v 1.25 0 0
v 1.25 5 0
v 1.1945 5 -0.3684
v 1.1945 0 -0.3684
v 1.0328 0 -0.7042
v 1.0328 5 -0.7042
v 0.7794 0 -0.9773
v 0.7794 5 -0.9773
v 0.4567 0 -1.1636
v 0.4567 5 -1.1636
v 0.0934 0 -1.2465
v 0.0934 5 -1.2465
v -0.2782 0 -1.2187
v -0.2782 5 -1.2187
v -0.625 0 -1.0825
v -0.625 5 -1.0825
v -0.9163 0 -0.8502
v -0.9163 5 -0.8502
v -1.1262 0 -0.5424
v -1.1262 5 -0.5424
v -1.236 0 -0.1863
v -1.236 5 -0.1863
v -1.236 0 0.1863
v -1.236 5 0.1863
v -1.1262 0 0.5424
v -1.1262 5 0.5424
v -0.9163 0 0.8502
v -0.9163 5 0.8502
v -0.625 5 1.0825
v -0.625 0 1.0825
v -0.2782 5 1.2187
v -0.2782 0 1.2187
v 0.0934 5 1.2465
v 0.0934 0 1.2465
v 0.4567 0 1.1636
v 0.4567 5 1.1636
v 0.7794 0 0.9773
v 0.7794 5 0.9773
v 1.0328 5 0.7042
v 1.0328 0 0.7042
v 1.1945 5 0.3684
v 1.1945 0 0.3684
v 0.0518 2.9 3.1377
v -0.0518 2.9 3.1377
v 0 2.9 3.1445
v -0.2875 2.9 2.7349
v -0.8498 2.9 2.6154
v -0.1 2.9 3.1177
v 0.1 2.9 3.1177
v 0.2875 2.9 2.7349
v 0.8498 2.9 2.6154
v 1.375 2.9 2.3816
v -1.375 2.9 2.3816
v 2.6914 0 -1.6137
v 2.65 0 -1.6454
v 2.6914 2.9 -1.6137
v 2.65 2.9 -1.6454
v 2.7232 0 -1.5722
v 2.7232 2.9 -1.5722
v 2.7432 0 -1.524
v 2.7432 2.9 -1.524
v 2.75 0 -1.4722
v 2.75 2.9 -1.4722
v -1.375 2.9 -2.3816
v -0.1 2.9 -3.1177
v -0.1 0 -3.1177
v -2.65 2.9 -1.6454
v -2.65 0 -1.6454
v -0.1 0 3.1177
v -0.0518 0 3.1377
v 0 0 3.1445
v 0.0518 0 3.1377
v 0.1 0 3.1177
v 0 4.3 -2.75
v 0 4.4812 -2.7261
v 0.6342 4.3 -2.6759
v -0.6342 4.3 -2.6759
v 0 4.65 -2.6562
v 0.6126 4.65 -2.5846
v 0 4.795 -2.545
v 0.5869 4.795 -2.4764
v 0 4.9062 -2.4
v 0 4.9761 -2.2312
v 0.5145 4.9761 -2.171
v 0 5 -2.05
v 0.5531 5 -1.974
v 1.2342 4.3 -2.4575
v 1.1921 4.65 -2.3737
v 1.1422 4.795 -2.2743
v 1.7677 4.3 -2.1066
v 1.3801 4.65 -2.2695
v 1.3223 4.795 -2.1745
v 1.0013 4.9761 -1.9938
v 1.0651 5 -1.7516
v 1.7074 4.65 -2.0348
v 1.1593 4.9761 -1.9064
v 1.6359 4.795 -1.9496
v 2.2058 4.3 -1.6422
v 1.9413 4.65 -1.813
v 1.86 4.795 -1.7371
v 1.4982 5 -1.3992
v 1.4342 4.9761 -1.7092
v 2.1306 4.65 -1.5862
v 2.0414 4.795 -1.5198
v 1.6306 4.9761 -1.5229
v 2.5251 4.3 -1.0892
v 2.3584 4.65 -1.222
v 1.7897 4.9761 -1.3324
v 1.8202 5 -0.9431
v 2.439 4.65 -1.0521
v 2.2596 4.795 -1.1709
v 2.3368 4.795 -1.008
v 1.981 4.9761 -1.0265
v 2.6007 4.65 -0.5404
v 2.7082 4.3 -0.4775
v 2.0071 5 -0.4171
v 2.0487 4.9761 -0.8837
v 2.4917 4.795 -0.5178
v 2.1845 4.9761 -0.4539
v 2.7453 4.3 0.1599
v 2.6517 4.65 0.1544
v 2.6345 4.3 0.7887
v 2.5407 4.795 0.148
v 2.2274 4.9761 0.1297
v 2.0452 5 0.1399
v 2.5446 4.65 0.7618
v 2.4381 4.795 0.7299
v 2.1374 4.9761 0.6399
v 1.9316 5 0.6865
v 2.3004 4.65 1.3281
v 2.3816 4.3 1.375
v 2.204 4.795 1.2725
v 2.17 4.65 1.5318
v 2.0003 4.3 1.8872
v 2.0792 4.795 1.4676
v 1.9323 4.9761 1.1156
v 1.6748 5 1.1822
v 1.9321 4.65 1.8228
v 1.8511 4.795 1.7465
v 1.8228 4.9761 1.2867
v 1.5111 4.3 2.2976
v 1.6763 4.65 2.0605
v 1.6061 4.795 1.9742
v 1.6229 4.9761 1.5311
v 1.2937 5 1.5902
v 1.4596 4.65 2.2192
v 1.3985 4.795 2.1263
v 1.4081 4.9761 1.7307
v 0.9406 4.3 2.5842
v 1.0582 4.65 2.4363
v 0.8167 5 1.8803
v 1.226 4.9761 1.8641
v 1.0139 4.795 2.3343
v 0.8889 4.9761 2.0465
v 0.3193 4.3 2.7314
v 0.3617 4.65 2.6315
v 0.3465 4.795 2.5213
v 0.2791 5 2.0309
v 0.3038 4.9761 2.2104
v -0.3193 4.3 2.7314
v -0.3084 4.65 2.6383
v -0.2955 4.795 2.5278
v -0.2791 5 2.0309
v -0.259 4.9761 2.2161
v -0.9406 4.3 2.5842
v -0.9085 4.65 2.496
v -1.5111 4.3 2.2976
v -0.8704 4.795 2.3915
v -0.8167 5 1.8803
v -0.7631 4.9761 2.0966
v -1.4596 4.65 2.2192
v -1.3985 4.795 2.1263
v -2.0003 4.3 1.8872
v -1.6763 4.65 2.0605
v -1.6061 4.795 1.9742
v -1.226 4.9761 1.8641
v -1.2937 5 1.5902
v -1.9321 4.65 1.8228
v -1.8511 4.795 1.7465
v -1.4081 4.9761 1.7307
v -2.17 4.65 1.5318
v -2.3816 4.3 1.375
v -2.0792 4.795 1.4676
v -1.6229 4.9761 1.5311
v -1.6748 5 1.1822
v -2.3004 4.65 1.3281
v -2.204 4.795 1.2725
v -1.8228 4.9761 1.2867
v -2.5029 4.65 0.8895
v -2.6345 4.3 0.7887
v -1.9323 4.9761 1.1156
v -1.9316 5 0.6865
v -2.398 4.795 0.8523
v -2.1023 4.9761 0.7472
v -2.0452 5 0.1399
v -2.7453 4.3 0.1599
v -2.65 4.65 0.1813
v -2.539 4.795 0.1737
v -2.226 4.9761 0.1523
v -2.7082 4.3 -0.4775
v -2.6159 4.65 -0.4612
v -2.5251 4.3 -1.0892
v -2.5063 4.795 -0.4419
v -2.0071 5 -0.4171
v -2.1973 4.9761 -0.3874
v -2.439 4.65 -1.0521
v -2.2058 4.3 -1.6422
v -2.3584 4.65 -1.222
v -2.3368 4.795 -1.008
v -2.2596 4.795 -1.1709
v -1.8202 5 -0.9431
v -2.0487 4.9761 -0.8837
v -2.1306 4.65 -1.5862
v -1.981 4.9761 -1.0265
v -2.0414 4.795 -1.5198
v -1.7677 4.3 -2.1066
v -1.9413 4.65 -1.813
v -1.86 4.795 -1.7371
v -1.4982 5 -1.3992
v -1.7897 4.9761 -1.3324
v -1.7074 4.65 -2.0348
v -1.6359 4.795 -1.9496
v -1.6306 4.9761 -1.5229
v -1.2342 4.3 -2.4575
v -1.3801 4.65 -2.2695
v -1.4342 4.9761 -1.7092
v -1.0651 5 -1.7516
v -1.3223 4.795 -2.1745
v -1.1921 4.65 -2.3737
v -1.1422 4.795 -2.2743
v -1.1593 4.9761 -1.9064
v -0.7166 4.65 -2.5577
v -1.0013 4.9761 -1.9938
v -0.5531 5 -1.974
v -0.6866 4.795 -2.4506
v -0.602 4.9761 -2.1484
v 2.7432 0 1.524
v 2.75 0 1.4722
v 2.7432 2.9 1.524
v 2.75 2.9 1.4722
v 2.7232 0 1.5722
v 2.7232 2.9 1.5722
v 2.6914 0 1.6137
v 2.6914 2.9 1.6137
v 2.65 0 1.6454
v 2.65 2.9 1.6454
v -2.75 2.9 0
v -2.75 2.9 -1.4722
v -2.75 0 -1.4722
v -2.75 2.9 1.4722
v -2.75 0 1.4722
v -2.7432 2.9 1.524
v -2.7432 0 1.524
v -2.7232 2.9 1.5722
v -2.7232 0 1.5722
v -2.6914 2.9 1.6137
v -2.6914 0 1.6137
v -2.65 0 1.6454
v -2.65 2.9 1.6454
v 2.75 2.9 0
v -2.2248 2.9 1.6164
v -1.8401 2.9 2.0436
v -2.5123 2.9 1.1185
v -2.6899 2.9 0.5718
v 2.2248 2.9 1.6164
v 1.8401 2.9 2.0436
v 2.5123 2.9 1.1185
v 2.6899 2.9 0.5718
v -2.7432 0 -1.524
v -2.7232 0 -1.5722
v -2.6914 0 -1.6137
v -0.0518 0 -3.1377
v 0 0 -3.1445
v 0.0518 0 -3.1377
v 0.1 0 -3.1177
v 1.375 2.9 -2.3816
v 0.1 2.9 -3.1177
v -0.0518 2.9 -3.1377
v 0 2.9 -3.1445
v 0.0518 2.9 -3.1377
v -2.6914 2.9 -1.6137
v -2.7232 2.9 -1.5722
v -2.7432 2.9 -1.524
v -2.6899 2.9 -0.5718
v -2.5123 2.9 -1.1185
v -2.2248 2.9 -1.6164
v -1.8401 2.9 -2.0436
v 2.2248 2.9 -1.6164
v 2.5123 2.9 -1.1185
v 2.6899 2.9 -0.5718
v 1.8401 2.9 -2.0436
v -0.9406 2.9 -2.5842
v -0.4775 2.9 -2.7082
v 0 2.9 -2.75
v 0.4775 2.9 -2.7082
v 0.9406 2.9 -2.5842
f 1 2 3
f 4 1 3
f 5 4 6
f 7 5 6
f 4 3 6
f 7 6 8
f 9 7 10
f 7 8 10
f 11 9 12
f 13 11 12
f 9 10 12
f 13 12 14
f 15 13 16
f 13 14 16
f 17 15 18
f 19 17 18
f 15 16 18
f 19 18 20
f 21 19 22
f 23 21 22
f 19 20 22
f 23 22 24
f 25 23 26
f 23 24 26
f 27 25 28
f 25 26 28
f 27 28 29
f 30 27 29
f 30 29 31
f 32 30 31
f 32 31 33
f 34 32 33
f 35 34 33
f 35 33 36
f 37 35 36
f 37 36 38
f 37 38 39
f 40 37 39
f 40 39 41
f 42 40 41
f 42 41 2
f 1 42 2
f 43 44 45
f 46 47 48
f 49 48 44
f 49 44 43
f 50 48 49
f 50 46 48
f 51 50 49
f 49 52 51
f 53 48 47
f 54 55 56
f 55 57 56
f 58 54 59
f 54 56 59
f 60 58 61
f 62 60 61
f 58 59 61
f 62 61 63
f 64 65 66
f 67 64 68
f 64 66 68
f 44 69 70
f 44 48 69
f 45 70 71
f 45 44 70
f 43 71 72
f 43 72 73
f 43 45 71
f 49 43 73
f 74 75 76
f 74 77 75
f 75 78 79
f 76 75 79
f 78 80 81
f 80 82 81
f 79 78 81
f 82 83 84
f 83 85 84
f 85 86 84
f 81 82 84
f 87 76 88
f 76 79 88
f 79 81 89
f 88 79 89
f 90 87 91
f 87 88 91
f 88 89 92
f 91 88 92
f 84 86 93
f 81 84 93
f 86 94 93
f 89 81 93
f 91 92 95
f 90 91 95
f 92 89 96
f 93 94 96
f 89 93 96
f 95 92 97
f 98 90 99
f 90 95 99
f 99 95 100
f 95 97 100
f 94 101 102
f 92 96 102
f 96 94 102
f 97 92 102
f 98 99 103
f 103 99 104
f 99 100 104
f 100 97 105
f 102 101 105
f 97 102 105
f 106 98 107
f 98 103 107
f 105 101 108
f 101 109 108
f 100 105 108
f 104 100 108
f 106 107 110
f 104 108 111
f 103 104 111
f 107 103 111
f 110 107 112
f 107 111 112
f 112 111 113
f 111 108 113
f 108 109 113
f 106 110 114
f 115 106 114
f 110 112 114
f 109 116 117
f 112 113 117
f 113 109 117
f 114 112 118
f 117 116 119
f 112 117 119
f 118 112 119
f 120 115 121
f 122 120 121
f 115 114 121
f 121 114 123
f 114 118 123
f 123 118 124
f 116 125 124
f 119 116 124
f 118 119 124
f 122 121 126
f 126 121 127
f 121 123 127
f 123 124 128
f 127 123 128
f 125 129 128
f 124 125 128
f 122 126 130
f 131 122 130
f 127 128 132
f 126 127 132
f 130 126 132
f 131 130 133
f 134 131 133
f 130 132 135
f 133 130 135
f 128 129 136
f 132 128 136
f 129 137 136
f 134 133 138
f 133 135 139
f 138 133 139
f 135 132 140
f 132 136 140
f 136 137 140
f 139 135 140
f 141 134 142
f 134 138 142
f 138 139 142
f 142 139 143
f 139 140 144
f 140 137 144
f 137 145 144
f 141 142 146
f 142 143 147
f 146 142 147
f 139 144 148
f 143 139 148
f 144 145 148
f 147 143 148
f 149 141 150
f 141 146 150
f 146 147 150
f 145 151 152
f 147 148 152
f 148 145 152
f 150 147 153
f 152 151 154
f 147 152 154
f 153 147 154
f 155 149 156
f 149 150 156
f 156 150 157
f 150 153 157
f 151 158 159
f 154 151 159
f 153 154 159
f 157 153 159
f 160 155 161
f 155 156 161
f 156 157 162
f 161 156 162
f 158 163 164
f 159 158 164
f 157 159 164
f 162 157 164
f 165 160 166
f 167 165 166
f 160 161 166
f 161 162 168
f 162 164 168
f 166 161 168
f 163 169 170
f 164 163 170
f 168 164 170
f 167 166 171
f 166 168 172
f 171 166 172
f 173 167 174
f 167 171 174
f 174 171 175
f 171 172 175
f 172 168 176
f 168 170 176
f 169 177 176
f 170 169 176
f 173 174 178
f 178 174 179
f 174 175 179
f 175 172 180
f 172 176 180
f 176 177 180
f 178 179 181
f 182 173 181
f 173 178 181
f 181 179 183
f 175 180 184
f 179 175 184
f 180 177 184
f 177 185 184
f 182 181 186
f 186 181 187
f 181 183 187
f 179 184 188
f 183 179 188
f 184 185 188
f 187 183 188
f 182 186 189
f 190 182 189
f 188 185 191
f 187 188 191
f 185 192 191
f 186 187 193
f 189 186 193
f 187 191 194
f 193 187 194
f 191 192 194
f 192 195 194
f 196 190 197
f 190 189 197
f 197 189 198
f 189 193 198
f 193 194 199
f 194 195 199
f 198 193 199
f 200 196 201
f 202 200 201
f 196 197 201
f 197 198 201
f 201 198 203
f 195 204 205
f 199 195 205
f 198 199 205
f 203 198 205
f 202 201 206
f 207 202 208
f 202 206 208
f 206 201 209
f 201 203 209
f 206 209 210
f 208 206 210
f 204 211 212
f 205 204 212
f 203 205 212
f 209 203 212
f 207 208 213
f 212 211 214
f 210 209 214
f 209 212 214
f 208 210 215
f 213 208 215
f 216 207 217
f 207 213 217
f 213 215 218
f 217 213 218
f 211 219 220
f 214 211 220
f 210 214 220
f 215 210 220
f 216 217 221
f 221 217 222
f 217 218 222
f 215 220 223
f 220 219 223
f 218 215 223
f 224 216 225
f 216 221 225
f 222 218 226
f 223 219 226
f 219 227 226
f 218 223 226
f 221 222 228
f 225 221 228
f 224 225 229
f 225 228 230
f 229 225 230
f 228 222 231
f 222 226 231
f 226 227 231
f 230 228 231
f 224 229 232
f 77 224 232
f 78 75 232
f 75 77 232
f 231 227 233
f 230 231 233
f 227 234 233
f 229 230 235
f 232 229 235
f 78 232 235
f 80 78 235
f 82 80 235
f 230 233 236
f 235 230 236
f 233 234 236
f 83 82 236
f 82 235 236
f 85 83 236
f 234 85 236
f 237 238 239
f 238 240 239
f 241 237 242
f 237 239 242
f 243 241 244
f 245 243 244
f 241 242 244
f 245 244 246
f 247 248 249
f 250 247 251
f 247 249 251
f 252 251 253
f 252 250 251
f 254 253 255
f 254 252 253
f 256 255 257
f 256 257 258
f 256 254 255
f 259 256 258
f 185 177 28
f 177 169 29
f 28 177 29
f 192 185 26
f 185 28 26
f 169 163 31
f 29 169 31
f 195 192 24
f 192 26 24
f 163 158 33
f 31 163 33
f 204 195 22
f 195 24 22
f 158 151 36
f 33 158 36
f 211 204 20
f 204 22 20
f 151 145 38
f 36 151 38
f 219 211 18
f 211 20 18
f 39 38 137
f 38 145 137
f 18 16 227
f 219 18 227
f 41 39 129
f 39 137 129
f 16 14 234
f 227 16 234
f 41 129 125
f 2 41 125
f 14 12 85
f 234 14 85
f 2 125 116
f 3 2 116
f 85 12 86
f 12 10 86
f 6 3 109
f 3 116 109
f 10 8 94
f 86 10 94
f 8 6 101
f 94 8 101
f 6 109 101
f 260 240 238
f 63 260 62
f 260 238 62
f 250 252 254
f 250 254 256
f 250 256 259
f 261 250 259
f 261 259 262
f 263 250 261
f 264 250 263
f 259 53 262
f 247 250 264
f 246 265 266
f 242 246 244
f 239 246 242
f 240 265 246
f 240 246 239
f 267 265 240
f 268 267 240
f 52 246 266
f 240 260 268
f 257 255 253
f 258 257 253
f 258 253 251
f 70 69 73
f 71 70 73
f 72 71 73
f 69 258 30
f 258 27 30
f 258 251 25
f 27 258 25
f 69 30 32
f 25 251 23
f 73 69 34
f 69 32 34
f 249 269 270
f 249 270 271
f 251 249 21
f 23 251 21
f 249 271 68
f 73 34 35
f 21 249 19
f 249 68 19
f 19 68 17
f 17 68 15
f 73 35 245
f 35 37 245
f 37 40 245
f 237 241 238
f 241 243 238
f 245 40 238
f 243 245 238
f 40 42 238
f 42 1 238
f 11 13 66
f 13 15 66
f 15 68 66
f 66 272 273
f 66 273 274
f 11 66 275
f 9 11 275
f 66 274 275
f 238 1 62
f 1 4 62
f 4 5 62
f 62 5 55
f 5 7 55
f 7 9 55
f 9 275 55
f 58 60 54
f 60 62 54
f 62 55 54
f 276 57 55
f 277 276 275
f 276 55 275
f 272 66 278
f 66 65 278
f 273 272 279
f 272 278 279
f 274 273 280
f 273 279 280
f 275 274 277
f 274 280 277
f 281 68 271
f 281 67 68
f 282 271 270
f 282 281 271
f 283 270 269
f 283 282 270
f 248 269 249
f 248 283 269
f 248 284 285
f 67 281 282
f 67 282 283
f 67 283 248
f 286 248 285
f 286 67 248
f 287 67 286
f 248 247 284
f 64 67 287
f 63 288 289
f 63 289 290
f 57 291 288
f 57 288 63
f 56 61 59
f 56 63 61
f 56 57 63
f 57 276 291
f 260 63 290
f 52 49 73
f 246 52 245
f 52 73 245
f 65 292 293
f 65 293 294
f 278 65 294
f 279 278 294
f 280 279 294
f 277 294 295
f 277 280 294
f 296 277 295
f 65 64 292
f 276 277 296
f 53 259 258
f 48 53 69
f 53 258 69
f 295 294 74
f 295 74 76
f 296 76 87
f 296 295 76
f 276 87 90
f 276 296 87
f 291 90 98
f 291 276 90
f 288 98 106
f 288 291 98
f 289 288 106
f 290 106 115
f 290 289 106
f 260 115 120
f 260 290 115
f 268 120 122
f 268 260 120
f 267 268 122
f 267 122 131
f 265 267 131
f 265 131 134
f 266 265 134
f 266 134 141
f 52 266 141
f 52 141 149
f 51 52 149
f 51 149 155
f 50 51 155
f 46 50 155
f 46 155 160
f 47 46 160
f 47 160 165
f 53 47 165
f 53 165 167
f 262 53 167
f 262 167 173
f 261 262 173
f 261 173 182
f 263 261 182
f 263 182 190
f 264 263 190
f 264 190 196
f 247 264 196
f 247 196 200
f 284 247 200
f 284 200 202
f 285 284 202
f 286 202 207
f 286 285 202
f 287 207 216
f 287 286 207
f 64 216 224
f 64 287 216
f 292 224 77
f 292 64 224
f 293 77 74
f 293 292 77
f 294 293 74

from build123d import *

# Parameters (mm, degrees)
EXTRUDE_1_DEPTH        = 2.9
SKETCH_2_R             = 2.75
EXTRUDE_2_DEPTH        = 5
FILLET_2_R             = 0.7
HOLE_WIZARD_M3_1_D     = 2.5
HOLE_WIZARD_M3_1_DEPTH = 10.1
HOLE_WIZARD_M3_1_TIP   = 0.751075774
FILLET_4_R             = 0.2


with BuildPart() as part:
    # 草图1 → 凸台-拉伸1 (new body)
    with BuildSketch(Plane(origin=(0, 0, 0), x_dir=(1, 0, 0), z_dir=(0, 1, 0))):
        Polygon((2.75, -1.58771324), (2.75, 1.58771324), (0, 3.175426481), (-2.75, 1.58771324), (-2.75, -1.58771324), (0, -3.175426481), align=None)
    extrude(amount=EXTRUDE_1_DEPTH)

    # 草图2 → 凸台-拉伸2 (add)
    with BuildSketch(Plane(origin=(0, 0, 0), x_dir=(-1, 0, 0), z_dir=(0, -1, 0))):
        with Locations(Location((0, 0, 0), (0, 0, 90))):
            Circle(SKETCH_2_R)
    extrude(amount=-EXTRUDE_2_DEPTH)

    # 圆角2
    fillet_2_edges = [part.edges().sort_by_distance(p)[0] for p in [
        (0, 5, 2.75),
    ]]
    fillet(fillet_2_edges, radius=FILLET_2_R)

    # M3 螺纹孔1
    with Locations(Plane(origin=(0, 0, 0), x_dir=(-1, 0, 0), z_dir=(0, -1, 0))):
        with Locations((0, 0)):
            Hole(HOLE_WIZARD_M3_1_D / 2, depth=HOLE_WIZARD_M3_1_DEPTH)
            with Locations((0, 0, -(HOLE_WIZARD_M3_1_DEPTH + HOLE_WIZARD_M3_1_TIP / 2))):  # 118° drill point
                Cone(0, HOLE_WIZARD_M3_1_D / 2, HOLE_WIZARD_M3_1_TIP, mode=Mode.SUBTRACT)

    # 圆角4
    fillet_4_edges = [part.edges().sort_by_distance(p)[0] for p in [
        (0, 1.45, 3.175426481),
        (-2.75, 1.45, 1.58771324),
        (-2.75, 1.45, -1.58771324),
        (0, 1.45, -3.175426481),
        (2.75, 1.45, -1.58771324),
        (2.75, 1.45, 1.58771324),
    ]]
    fillet(fillet_4_edges, radius=FILLET_4_R)


solid = part.part
